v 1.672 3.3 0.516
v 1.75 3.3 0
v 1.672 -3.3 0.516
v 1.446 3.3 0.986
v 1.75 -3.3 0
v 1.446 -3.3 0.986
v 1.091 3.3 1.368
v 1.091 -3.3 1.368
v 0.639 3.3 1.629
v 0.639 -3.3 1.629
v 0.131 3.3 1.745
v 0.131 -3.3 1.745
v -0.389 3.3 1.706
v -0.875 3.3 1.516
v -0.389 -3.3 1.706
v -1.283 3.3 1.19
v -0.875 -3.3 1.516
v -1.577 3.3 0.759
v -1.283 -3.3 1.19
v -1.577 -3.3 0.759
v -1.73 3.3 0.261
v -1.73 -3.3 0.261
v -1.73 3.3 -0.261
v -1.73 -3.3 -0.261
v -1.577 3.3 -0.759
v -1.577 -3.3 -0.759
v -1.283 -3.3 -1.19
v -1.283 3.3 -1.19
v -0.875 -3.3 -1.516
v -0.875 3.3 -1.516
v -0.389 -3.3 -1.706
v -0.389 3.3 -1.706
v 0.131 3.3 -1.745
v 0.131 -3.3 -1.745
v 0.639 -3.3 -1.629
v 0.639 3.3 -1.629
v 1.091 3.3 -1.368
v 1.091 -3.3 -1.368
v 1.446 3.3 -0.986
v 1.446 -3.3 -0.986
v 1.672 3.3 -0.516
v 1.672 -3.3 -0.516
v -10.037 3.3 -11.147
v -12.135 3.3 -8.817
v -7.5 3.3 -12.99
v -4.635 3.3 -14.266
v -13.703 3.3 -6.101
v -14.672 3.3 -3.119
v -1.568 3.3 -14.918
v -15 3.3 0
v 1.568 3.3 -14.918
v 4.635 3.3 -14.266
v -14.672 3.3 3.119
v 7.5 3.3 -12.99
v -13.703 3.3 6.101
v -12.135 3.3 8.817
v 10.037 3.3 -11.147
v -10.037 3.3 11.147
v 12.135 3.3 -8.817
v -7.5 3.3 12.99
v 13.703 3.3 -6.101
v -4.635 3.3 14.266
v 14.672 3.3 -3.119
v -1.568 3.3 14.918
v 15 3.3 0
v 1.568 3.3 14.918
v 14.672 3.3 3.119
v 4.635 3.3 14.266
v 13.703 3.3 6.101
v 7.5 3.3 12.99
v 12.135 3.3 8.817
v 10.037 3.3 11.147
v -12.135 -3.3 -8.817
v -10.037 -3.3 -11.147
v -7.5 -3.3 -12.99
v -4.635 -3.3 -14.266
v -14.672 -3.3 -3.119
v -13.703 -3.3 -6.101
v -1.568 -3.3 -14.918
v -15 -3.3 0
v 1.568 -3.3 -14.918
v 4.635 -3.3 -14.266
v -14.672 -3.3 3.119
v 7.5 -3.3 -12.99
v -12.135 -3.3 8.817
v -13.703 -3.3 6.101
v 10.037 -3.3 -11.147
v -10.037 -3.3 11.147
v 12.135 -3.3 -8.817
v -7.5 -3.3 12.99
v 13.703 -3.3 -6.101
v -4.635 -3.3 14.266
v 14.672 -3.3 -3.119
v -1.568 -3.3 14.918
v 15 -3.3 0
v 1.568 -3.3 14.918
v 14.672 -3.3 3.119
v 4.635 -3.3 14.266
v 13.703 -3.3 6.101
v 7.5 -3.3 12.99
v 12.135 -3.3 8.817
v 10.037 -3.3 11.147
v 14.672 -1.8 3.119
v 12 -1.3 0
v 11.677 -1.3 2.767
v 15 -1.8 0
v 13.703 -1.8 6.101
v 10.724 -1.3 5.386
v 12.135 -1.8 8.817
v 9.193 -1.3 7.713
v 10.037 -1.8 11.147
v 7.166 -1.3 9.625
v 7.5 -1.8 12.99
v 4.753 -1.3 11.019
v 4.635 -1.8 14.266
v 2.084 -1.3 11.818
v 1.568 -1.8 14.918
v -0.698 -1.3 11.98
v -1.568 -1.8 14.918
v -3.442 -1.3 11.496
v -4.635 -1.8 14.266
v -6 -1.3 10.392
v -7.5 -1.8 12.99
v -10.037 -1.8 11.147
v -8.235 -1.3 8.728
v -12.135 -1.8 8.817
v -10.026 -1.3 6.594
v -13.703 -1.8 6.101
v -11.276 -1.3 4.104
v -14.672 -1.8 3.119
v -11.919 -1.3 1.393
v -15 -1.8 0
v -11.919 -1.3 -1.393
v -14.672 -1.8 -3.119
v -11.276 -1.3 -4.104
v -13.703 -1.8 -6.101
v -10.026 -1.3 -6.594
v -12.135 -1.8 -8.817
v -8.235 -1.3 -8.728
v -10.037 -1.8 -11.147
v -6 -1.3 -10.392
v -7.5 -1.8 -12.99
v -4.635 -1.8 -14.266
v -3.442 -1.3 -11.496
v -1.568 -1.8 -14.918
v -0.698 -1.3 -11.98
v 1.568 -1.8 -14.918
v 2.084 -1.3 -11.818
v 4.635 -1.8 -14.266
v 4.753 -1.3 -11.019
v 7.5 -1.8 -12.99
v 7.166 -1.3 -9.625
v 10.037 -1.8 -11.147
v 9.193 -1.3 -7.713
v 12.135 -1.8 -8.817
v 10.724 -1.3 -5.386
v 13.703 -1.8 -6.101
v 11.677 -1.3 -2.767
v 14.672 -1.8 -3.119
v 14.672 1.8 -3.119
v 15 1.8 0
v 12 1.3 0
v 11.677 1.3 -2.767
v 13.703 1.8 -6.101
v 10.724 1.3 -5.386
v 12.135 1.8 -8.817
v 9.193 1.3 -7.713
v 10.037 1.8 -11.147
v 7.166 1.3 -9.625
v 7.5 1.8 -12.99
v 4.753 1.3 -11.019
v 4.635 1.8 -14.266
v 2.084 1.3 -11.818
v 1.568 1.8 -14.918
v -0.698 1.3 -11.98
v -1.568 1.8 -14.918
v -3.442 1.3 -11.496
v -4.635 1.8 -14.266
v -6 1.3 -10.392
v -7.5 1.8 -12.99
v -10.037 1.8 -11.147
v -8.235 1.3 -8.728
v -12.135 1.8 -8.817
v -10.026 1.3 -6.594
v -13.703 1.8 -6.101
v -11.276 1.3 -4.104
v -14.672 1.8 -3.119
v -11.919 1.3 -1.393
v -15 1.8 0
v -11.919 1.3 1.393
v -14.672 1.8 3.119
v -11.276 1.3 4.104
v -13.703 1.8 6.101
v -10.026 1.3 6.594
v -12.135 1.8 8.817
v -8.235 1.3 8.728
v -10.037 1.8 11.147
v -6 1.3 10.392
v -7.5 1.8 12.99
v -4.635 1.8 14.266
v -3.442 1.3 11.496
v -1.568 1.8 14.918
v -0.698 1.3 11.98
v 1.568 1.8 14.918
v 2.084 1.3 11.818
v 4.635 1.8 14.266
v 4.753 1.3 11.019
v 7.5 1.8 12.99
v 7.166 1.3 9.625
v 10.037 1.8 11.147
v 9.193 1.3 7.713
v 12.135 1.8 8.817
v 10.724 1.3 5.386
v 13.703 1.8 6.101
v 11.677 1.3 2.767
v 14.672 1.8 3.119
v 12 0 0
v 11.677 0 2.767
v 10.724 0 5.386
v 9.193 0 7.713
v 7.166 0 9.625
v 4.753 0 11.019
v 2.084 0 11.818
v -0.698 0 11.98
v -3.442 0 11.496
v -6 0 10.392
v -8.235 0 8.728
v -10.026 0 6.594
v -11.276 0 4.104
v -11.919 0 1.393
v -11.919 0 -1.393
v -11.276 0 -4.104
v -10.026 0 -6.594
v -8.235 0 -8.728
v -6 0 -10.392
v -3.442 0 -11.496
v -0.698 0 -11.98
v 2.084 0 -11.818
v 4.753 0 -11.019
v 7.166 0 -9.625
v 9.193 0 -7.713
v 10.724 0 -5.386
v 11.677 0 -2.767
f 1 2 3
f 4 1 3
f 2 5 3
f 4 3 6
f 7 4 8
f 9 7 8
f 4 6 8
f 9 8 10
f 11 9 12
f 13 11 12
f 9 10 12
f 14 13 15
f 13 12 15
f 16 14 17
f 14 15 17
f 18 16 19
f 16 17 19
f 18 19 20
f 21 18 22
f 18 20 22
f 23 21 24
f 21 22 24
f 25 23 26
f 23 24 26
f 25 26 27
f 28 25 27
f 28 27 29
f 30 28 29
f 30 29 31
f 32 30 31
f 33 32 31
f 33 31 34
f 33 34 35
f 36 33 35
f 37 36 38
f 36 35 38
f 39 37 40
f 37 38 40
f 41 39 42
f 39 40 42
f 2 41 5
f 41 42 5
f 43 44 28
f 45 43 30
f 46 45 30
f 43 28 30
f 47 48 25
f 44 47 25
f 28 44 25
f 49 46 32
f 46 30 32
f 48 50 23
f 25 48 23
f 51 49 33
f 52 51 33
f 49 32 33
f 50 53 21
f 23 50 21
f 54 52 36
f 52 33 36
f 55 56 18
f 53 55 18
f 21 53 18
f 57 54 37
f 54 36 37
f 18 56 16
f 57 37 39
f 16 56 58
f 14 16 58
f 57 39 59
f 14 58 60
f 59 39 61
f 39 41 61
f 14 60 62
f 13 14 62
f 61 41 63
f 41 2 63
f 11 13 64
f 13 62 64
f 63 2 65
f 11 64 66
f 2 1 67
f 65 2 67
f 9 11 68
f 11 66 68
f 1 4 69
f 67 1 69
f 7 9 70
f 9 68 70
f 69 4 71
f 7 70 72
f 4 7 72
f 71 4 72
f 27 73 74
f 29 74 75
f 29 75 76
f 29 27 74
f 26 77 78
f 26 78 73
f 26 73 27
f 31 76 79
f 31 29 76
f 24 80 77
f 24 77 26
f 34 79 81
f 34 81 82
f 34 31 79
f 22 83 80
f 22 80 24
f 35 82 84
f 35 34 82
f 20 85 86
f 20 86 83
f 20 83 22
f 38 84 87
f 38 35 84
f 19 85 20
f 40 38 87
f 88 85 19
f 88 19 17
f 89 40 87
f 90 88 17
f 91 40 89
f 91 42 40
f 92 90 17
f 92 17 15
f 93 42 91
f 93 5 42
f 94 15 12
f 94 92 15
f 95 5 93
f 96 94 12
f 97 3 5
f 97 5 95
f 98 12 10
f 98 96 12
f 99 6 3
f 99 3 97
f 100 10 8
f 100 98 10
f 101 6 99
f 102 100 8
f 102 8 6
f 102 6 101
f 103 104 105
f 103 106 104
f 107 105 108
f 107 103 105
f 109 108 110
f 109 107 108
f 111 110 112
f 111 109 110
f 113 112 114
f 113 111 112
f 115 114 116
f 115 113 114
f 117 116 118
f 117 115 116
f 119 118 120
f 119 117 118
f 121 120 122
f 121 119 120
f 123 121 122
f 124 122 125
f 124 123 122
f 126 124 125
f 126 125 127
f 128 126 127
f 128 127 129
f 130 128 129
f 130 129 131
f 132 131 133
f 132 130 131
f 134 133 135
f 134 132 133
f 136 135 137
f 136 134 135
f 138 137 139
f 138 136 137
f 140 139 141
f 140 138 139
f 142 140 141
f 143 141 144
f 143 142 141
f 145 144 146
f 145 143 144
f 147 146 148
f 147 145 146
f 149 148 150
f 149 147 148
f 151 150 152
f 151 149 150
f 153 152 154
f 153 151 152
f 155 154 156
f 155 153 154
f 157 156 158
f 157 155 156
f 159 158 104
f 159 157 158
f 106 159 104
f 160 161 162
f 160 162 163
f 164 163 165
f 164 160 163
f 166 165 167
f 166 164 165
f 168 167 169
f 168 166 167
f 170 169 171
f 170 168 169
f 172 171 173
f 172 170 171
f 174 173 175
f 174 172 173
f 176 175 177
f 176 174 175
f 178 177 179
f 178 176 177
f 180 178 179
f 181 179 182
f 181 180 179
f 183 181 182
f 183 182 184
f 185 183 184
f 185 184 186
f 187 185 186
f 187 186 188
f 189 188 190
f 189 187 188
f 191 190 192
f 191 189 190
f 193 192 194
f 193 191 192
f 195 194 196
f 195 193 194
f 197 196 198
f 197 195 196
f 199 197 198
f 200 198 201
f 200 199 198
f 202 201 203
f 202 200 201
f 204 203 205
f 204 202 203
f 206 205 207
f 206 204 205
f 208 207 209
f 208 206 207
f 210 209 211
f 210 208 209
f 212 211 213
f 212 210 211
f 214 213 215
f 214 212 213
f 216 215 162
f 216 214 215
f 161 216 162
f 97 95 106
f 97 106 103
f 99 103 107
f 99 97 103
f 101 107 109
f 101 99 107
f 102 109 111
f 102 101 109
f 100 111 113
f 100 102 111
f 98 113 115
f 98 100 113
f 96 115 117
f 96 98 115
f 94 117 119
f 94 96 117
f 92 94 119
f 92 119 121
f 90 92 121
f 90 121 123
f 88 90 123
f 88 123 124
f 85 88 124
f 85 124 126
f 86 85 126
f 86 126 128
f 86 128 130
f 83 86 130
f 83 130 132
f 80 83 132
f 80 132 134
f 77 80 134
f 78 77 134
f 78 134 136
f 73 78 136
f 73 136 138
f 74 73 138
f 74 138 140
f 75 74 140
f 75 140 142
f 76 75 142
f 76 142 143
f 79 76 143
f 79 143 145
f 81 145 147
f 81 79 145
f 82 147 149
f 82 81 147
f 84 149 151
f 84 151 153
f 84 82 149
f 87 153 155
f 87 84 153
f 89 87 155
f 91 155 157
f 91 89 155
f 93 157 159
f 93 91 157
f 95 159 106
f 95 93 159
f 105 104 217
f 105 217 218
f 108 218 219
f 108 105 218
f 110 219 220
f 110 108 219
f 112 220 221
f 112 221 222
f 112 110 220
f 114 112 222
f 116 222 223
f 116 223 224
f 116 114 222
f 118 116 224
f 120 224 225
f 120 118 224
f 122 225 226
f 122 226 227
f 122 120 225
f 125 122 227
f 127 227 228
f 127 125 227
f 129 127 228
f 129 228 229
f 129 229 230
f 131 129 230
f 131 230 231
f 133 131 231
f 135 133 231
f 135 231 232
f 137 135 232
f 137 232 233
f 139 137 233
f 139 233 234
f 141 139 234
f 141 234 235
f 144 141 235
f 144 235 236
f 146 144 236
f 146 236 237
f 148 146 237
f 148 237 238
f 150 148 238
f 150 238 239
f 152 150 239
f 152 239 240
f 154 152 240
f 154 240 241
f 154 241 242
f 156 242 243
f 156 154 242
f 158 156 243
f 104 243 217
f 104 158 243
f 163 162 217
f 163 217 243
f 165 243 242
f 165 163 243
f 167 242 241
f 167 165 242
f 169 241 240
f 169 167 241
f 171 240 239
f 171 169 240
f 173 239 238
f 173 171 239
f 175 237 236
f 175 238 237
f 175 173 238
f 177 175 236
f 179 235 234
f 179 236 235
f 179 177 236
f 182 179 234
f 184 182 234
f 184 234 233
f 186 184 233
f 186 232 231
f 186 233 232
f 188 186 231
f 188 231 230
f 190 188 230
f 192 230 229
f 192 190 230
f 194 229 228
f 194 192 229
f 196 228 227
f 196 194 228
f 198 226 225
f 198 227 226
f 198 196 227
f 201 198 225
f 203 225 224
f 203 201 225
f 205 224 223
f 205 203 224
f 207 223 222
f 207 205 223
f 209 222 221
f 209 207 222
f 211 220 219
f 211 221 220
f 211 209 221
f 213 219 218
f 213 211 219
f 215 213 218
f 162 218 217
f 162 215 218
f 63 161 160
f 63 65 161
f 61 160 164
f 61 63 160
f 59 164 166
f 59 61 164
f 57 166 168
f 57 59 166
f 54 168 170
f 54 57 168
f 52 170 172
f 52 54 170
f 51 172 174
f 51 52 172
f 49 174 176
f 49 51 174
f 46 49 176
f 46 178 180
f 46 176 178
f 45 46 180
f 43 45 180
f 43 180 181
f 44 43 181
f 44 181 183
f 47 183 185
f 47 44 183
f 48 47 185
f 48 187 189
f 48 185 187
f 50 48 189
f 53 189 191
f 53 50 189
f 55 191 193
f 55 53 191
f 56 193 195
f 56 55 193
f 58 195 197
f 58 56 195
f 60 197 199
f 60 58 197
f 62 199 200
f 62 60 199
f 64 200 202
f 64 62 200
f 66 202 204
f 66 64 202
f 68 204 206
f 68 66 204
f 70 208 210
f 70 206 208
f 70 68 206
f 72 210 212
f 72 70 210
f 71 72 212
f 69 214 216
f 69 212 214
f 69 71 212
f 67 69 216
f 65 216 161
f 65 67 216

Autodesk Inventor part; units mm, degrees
ref_plane "YZ Plane" through (0, 0, 0) normal (1, 0, 0) x (0, 1, 0)
ref_plane "XZ Plane" through (0, 0, 0) normal (0, 1, 0) x (-1, 0, 0)
ref_plane "XY Plane" through (0, 0, 0) normal (0, 0, 1) x (1, 0, 0)
sketch "스케치1" plane through (0, 0, 0) normal (0, 0, 1) x (1, 0, 0)
  line L0 (0, 0) -> (12, 0) construction
  line L1 (12, 0) -> (12, 1.3)
  line L2 (12, 1.3) -> (15, 1.8)
  line L3 (15, 1.8) -> (15, 3.3)
  line L4 (15, 3.3) -> (0, 3.3)
  line L5 (0, 3.3) -> (0, 0)
  line L6 (12, 0) -> (12, -1.3)
  line L7 (12, -1.3) -> (15, -1.8)
  line L8 (15, -1.8) -> (15, -3.3)
  line L9 (15, -3.3) -> (0, -3.3)
  line L10 (0, -3.3) -> (0, 0)
  line L11 (1.75, 3.3) -> (1.75, -3.3)
  dimension "d0" = 3.3
  dimension "d1" = 15
  dimension "d2" = 12
  dimension "d3" = 0.5
  dimension "d4" = 1.5
  dimension "d6" = 1.75
revolve "회전1" add sketch "스케치1" angle 360 about axis through (0, 3.3, 0) along (0, -1, 0) contours L6 L7 L8 L9 L11 L4 L3 L2 L1
properties part number "회전 축 휠"
